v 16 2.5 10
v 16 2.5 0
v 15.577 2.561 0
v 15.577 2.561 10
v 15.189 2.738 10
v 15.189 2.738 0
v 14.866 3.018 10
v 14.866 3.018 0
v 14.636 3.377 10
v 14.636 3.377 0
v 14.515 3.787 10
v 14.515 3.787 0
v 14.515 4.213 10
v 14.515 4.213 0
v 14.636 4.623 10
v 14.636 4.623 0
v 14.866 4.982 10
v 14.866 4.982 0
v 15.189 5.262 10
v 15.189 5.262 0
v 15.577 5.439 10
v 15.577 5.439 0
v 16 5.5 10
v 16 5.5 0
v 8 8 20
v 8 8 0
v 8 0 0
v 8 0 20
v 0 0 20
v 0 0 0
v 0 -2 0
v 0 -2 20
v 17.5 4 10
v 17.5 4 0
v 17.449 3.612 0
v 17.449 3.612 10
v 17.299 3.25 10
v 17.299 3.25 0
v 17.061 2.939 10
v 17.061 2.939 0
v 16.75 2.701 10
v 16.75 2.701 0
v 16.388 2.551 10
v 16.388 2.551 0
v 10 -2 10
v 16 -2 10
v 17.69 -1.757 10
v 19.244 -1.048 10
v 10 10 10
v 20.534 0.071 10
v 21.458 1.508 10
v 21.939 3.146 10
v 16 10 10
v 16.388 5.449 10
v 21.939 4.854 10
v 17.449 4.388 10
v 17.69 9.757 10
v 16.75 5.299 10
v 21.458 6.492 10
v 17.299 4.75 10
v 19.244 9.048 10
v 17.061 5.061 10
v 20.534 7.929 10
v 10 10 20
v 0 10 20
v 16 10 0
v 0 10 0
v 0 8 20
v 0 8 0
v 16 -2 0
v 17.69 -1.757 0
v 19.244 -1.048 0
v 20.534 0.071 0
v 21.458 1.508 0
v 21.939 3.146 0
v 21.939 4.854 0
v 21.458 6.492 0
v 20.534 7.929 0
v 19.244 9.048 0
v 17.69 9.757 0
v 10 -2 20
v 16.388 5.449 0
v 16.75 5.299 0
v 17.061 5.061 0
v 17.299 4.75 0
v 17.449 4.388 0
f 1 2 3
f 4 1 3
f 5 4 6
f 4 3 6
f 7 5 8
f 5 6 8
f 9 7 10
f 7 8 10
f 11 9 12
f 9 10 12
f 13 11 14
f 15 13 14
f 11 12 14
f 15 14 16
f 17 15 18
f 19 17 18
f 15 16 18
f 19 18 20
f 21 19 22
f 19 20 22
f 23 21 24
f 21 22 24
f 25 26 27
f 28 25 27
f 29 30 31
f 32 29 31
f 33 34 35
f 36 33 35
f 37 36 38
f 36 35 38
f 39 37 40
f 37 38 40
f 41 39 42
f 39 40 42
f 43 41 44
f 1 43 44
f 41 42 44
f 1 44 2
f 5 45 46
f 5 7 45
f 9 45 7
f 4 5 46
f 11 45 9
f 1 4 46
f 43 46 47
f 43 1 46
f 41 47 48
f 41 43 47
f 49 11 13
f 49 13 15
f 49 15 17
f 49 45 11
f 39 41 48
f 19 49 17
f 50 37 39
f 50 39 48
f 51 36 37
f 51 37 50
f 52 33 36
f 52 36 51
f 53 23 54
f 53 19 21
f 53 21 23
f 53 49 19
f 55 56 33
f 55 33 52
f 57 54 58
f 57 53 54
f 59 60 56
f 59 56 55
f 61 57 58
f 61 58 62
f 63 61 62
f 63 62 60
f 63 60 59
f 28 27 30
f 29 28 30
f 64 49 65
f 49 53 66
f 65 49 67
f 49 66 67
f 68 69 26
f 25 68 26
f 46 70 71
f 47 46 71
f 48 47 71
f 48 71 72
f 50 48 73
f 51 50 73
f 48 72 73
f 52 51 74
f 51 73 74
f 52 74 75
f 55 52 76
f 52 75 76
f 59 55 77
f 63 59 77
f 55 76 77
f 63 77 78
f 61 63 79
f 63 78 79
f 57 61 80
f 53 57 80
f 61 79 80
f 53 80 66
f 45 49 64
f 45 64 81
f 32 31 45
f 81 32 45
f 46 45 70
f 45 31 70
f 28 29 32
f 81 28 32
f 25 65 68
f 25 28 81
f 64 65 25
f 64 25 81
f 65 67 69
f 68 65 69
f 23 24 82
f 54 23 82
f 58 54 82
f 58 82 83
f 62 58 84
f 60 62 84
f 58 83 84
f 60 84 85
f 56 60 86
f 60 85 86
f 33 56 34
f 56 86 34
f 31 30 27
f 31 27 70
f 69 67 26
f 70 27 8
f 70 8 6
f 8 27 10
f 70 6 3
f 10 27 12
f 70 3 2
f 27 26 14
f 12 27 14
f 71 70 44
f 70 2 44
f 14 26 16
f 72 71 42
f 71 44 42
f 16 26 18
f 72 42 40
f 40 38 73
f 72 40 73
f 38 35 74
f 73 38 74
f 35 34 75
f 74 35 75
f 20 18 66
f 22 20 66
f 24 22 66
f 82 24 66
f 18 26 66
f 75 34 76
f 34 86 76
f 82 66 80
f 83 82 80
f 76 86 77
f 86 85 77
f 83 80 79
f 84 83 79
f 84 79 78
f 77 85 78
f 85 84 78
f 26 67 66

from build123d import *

# Parameters (mm, degrees)
F1_DEPTH  = 20
F2_START  = 10
F1_FACE_R = 1.5
F2_DEPTH  = 10


# Not quite as in the source:
# - a feature names something its author has since deleted; it is built from what else it names


with BuildPart() as f1:
    # F0 (on Top) → F1 (new body)
    with BuildSketch(Plane.XY):
        Polygon((8, 0), (0, 0), (0, -2), (10, -2), (10, 4), (10, 10), (0, 10), (0, 8), (8, 8), align=None)
        with BuildLine():
            Line((16, 2.5), (16, -2))
            ThreePointArc((16, -2), (22, 4), (16, 10))
            Line((16, 10), (16, 5.5))
            ThreePointArc((16, 5.5), (17.0606601718, 5.0606601718), (17.5, 4))
            ThreePointArc((17.5, 4), (17.0606601718, 2.9393398282), (16, 2.5))
        make_face()
        with BuildLine():
            ThreePointArc((10, 4), (11.7573593129, -0.2426406871), (16, -2))
            Line((16, -2), (16, 2.5))
            ThreePointArc((16, 2.5), (14.5, 4), (16, 5.5))
            Line((16, 5.5), (16, 10))
            ThreePointArc((16, 10), (11.7573593129, 8.2426406871), (10, 4))
        make_face()
        with BuildLine():
            Line((16, 10), (10, 10))
            Line((10, 10), (10, 4))
            ThreePointArc((10, 4), (11.7573593129, 8.2426406871), (16, 10))
        make_face()
        with BuildLine():
            Line((10, 4), (10, -2))
            Line((10, -2), (16, -2))
            ThreePointArc((16, -2), (11.7573593129, -0.2426406871), (10, 4))
        make_face()
    extrude(amount=F1_DEPTH)

    # F0 (on Top) + F1_face (on face) → F2 (cut)
    with BuildSketch(Plane.XY.offset(F2_START)):
        with BuildLine():
            Line((16, 2.5), (16, -2))
            ThreePointArc((16, -2), (22, 4), (16, 10))
            Line((16, 10), (16, 5.5))
            ThreePointArc((16, 5.5), (17.0606601718, 5.0606601718), (17.5, 4))
            ThreePointArc((17.5, 4), (17.0606601718, 2.9393398282), (16, 2.5))
        make_face()
        with BuildLine():
            ThreePointArc((10, 4), (11.7573593129, -0.2426406871), (16, -2))
            Line((16, -2), (16, 2.5))
            ThreePointArc((16, 2.5), (14.5, 4), (16, 5.5))
            Line((16, 5.5), (16, 10))
            ThreePointArc((16, 10), (11.7573593129, 8.2426406871), (10, 4))
        make_face()
        with BuildLine():
            Line((10, 4), (10, -2))
            Line((10, -2), (16, -2))
            ThreePointArc((16, -2), (11.7573593129, -0.2426406871), (10, 4))
        make_face()
        with BuildLine():
            Line((16, 10), (10, 10))
            Line((10, 10), (10, 4))
            ThreePointArc((10, 4), (11.7573593129, 8.2426406871), (16, 10))
        make_face()
    with BuildSketch(Plane(origin=(12.4841125556, 4, 20), x_dir=(1, 0, 0), z_dir=(0, 0, 1)).offset(F2_START)):
        with BuildLine():
            Line((-4.4841125556, -4), (-12.4841125556, -4))
            Line((-12.4841125556, -4), (-12.4841125556, -6))
            Line((-12.4841125556, -6), (3.5158874444, -6))
            ThreePointArc((3.5158874444, -6), (9.5158874444, 0), (3.5158874444, 6))
            Line((3.5158874444, 6), (-12.4841125556, 6))
            Line((-12.4841125556, 6), (-12.4841125556, 4))
            Line((-12.4841125556, 4), (-4.4841125556, 4))
            Line((-4.4841125556, 4), (-4.4841125556, -4))
        make_face()
        with Locations((3.5158874444, 0)):
            Circle(F1_FACE_R, mode=Mode.SUBTRACT)
    extrude(amount=F2_DEPTH, mode=Mode.SUBTRACT)


solid = f1.part
